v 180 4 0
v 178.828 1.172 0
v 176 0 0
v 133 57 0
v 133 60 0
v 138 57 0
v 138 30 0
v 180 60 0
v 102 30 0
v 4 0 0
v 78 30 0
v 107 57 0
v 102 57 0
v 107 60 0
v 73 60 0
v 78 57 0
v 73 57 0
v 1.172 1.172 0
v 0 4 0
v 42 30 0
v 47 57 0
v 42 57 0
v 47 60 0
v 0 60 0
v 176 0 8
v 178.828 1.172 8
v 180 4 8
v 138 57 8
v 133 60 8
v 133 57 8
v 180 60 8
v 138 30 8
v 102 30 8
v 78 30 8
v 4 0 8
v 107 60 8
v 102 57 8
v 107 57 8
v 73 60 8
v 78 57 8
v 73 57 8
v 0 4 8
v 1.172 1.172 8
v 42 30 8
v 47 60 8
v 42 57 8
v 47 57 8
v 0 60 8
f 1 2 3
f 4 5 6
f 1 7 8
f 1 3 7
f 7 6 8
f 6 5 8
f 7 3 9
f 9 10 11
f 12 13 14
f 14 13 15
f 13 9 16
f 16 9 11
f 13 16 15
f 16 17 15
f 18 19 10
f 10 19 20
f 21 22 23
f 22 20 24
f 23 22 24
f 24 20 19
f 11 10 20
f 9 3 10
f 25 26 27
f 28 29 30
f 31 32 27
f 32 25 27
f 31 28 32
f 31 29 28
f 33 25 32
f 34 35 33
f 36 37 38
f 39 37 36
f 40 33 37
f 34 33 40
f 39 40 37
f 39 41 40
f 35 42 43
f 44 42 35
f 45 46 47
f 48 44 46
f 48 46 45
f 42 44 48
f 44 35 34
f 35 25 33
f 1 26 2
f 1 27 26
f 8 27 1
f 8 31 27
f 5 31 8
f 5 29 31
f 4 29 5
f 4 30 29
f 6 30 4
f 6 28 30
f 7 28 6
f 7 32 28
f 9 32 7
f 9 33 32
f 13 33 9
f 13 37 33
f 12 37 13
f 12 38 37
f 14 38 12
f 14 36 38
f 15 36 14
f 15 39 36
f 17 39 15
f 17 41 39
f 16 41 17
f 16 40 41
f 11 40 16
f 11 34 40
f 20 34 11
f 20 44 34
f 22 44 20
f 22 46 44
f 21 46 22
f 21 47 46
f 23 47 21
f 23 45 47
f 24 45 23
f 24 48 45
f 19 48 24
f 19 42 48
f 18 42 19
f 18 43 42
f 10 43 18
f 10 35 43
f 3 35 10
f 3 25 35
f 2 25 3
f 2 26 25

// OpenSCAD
$fn = 32;

// ----------------------------------------------------------------------
// Oversize slot bar: 180 mm bar with 2 oversize windows
// ----------------------------------------------------------------------

// --- parameters (mm) ---
profile_height = 8;       // extrusion height
profile_points = 24;      // points of the closed outline

profile = [[0, 4], [1.172, 1.172], [4, 0], [176, 0], [178.828, 1.172], [180, 4], [180, 60], [133, 60], [133, 57], [138, 57], [138, 30], [102, 30], [102, 57], [107, 57], [107, 60], [73, 60], [73, 57], [78, 57], [78, 30], [42, 30], [42, 57], [47, 57], [47, 60], [0, 60]];  // single closed polygon, 24 points, counter clockwise

// --- the one profile operation ---
linear_extrude(height = profile_height) polygon(points = profile);
